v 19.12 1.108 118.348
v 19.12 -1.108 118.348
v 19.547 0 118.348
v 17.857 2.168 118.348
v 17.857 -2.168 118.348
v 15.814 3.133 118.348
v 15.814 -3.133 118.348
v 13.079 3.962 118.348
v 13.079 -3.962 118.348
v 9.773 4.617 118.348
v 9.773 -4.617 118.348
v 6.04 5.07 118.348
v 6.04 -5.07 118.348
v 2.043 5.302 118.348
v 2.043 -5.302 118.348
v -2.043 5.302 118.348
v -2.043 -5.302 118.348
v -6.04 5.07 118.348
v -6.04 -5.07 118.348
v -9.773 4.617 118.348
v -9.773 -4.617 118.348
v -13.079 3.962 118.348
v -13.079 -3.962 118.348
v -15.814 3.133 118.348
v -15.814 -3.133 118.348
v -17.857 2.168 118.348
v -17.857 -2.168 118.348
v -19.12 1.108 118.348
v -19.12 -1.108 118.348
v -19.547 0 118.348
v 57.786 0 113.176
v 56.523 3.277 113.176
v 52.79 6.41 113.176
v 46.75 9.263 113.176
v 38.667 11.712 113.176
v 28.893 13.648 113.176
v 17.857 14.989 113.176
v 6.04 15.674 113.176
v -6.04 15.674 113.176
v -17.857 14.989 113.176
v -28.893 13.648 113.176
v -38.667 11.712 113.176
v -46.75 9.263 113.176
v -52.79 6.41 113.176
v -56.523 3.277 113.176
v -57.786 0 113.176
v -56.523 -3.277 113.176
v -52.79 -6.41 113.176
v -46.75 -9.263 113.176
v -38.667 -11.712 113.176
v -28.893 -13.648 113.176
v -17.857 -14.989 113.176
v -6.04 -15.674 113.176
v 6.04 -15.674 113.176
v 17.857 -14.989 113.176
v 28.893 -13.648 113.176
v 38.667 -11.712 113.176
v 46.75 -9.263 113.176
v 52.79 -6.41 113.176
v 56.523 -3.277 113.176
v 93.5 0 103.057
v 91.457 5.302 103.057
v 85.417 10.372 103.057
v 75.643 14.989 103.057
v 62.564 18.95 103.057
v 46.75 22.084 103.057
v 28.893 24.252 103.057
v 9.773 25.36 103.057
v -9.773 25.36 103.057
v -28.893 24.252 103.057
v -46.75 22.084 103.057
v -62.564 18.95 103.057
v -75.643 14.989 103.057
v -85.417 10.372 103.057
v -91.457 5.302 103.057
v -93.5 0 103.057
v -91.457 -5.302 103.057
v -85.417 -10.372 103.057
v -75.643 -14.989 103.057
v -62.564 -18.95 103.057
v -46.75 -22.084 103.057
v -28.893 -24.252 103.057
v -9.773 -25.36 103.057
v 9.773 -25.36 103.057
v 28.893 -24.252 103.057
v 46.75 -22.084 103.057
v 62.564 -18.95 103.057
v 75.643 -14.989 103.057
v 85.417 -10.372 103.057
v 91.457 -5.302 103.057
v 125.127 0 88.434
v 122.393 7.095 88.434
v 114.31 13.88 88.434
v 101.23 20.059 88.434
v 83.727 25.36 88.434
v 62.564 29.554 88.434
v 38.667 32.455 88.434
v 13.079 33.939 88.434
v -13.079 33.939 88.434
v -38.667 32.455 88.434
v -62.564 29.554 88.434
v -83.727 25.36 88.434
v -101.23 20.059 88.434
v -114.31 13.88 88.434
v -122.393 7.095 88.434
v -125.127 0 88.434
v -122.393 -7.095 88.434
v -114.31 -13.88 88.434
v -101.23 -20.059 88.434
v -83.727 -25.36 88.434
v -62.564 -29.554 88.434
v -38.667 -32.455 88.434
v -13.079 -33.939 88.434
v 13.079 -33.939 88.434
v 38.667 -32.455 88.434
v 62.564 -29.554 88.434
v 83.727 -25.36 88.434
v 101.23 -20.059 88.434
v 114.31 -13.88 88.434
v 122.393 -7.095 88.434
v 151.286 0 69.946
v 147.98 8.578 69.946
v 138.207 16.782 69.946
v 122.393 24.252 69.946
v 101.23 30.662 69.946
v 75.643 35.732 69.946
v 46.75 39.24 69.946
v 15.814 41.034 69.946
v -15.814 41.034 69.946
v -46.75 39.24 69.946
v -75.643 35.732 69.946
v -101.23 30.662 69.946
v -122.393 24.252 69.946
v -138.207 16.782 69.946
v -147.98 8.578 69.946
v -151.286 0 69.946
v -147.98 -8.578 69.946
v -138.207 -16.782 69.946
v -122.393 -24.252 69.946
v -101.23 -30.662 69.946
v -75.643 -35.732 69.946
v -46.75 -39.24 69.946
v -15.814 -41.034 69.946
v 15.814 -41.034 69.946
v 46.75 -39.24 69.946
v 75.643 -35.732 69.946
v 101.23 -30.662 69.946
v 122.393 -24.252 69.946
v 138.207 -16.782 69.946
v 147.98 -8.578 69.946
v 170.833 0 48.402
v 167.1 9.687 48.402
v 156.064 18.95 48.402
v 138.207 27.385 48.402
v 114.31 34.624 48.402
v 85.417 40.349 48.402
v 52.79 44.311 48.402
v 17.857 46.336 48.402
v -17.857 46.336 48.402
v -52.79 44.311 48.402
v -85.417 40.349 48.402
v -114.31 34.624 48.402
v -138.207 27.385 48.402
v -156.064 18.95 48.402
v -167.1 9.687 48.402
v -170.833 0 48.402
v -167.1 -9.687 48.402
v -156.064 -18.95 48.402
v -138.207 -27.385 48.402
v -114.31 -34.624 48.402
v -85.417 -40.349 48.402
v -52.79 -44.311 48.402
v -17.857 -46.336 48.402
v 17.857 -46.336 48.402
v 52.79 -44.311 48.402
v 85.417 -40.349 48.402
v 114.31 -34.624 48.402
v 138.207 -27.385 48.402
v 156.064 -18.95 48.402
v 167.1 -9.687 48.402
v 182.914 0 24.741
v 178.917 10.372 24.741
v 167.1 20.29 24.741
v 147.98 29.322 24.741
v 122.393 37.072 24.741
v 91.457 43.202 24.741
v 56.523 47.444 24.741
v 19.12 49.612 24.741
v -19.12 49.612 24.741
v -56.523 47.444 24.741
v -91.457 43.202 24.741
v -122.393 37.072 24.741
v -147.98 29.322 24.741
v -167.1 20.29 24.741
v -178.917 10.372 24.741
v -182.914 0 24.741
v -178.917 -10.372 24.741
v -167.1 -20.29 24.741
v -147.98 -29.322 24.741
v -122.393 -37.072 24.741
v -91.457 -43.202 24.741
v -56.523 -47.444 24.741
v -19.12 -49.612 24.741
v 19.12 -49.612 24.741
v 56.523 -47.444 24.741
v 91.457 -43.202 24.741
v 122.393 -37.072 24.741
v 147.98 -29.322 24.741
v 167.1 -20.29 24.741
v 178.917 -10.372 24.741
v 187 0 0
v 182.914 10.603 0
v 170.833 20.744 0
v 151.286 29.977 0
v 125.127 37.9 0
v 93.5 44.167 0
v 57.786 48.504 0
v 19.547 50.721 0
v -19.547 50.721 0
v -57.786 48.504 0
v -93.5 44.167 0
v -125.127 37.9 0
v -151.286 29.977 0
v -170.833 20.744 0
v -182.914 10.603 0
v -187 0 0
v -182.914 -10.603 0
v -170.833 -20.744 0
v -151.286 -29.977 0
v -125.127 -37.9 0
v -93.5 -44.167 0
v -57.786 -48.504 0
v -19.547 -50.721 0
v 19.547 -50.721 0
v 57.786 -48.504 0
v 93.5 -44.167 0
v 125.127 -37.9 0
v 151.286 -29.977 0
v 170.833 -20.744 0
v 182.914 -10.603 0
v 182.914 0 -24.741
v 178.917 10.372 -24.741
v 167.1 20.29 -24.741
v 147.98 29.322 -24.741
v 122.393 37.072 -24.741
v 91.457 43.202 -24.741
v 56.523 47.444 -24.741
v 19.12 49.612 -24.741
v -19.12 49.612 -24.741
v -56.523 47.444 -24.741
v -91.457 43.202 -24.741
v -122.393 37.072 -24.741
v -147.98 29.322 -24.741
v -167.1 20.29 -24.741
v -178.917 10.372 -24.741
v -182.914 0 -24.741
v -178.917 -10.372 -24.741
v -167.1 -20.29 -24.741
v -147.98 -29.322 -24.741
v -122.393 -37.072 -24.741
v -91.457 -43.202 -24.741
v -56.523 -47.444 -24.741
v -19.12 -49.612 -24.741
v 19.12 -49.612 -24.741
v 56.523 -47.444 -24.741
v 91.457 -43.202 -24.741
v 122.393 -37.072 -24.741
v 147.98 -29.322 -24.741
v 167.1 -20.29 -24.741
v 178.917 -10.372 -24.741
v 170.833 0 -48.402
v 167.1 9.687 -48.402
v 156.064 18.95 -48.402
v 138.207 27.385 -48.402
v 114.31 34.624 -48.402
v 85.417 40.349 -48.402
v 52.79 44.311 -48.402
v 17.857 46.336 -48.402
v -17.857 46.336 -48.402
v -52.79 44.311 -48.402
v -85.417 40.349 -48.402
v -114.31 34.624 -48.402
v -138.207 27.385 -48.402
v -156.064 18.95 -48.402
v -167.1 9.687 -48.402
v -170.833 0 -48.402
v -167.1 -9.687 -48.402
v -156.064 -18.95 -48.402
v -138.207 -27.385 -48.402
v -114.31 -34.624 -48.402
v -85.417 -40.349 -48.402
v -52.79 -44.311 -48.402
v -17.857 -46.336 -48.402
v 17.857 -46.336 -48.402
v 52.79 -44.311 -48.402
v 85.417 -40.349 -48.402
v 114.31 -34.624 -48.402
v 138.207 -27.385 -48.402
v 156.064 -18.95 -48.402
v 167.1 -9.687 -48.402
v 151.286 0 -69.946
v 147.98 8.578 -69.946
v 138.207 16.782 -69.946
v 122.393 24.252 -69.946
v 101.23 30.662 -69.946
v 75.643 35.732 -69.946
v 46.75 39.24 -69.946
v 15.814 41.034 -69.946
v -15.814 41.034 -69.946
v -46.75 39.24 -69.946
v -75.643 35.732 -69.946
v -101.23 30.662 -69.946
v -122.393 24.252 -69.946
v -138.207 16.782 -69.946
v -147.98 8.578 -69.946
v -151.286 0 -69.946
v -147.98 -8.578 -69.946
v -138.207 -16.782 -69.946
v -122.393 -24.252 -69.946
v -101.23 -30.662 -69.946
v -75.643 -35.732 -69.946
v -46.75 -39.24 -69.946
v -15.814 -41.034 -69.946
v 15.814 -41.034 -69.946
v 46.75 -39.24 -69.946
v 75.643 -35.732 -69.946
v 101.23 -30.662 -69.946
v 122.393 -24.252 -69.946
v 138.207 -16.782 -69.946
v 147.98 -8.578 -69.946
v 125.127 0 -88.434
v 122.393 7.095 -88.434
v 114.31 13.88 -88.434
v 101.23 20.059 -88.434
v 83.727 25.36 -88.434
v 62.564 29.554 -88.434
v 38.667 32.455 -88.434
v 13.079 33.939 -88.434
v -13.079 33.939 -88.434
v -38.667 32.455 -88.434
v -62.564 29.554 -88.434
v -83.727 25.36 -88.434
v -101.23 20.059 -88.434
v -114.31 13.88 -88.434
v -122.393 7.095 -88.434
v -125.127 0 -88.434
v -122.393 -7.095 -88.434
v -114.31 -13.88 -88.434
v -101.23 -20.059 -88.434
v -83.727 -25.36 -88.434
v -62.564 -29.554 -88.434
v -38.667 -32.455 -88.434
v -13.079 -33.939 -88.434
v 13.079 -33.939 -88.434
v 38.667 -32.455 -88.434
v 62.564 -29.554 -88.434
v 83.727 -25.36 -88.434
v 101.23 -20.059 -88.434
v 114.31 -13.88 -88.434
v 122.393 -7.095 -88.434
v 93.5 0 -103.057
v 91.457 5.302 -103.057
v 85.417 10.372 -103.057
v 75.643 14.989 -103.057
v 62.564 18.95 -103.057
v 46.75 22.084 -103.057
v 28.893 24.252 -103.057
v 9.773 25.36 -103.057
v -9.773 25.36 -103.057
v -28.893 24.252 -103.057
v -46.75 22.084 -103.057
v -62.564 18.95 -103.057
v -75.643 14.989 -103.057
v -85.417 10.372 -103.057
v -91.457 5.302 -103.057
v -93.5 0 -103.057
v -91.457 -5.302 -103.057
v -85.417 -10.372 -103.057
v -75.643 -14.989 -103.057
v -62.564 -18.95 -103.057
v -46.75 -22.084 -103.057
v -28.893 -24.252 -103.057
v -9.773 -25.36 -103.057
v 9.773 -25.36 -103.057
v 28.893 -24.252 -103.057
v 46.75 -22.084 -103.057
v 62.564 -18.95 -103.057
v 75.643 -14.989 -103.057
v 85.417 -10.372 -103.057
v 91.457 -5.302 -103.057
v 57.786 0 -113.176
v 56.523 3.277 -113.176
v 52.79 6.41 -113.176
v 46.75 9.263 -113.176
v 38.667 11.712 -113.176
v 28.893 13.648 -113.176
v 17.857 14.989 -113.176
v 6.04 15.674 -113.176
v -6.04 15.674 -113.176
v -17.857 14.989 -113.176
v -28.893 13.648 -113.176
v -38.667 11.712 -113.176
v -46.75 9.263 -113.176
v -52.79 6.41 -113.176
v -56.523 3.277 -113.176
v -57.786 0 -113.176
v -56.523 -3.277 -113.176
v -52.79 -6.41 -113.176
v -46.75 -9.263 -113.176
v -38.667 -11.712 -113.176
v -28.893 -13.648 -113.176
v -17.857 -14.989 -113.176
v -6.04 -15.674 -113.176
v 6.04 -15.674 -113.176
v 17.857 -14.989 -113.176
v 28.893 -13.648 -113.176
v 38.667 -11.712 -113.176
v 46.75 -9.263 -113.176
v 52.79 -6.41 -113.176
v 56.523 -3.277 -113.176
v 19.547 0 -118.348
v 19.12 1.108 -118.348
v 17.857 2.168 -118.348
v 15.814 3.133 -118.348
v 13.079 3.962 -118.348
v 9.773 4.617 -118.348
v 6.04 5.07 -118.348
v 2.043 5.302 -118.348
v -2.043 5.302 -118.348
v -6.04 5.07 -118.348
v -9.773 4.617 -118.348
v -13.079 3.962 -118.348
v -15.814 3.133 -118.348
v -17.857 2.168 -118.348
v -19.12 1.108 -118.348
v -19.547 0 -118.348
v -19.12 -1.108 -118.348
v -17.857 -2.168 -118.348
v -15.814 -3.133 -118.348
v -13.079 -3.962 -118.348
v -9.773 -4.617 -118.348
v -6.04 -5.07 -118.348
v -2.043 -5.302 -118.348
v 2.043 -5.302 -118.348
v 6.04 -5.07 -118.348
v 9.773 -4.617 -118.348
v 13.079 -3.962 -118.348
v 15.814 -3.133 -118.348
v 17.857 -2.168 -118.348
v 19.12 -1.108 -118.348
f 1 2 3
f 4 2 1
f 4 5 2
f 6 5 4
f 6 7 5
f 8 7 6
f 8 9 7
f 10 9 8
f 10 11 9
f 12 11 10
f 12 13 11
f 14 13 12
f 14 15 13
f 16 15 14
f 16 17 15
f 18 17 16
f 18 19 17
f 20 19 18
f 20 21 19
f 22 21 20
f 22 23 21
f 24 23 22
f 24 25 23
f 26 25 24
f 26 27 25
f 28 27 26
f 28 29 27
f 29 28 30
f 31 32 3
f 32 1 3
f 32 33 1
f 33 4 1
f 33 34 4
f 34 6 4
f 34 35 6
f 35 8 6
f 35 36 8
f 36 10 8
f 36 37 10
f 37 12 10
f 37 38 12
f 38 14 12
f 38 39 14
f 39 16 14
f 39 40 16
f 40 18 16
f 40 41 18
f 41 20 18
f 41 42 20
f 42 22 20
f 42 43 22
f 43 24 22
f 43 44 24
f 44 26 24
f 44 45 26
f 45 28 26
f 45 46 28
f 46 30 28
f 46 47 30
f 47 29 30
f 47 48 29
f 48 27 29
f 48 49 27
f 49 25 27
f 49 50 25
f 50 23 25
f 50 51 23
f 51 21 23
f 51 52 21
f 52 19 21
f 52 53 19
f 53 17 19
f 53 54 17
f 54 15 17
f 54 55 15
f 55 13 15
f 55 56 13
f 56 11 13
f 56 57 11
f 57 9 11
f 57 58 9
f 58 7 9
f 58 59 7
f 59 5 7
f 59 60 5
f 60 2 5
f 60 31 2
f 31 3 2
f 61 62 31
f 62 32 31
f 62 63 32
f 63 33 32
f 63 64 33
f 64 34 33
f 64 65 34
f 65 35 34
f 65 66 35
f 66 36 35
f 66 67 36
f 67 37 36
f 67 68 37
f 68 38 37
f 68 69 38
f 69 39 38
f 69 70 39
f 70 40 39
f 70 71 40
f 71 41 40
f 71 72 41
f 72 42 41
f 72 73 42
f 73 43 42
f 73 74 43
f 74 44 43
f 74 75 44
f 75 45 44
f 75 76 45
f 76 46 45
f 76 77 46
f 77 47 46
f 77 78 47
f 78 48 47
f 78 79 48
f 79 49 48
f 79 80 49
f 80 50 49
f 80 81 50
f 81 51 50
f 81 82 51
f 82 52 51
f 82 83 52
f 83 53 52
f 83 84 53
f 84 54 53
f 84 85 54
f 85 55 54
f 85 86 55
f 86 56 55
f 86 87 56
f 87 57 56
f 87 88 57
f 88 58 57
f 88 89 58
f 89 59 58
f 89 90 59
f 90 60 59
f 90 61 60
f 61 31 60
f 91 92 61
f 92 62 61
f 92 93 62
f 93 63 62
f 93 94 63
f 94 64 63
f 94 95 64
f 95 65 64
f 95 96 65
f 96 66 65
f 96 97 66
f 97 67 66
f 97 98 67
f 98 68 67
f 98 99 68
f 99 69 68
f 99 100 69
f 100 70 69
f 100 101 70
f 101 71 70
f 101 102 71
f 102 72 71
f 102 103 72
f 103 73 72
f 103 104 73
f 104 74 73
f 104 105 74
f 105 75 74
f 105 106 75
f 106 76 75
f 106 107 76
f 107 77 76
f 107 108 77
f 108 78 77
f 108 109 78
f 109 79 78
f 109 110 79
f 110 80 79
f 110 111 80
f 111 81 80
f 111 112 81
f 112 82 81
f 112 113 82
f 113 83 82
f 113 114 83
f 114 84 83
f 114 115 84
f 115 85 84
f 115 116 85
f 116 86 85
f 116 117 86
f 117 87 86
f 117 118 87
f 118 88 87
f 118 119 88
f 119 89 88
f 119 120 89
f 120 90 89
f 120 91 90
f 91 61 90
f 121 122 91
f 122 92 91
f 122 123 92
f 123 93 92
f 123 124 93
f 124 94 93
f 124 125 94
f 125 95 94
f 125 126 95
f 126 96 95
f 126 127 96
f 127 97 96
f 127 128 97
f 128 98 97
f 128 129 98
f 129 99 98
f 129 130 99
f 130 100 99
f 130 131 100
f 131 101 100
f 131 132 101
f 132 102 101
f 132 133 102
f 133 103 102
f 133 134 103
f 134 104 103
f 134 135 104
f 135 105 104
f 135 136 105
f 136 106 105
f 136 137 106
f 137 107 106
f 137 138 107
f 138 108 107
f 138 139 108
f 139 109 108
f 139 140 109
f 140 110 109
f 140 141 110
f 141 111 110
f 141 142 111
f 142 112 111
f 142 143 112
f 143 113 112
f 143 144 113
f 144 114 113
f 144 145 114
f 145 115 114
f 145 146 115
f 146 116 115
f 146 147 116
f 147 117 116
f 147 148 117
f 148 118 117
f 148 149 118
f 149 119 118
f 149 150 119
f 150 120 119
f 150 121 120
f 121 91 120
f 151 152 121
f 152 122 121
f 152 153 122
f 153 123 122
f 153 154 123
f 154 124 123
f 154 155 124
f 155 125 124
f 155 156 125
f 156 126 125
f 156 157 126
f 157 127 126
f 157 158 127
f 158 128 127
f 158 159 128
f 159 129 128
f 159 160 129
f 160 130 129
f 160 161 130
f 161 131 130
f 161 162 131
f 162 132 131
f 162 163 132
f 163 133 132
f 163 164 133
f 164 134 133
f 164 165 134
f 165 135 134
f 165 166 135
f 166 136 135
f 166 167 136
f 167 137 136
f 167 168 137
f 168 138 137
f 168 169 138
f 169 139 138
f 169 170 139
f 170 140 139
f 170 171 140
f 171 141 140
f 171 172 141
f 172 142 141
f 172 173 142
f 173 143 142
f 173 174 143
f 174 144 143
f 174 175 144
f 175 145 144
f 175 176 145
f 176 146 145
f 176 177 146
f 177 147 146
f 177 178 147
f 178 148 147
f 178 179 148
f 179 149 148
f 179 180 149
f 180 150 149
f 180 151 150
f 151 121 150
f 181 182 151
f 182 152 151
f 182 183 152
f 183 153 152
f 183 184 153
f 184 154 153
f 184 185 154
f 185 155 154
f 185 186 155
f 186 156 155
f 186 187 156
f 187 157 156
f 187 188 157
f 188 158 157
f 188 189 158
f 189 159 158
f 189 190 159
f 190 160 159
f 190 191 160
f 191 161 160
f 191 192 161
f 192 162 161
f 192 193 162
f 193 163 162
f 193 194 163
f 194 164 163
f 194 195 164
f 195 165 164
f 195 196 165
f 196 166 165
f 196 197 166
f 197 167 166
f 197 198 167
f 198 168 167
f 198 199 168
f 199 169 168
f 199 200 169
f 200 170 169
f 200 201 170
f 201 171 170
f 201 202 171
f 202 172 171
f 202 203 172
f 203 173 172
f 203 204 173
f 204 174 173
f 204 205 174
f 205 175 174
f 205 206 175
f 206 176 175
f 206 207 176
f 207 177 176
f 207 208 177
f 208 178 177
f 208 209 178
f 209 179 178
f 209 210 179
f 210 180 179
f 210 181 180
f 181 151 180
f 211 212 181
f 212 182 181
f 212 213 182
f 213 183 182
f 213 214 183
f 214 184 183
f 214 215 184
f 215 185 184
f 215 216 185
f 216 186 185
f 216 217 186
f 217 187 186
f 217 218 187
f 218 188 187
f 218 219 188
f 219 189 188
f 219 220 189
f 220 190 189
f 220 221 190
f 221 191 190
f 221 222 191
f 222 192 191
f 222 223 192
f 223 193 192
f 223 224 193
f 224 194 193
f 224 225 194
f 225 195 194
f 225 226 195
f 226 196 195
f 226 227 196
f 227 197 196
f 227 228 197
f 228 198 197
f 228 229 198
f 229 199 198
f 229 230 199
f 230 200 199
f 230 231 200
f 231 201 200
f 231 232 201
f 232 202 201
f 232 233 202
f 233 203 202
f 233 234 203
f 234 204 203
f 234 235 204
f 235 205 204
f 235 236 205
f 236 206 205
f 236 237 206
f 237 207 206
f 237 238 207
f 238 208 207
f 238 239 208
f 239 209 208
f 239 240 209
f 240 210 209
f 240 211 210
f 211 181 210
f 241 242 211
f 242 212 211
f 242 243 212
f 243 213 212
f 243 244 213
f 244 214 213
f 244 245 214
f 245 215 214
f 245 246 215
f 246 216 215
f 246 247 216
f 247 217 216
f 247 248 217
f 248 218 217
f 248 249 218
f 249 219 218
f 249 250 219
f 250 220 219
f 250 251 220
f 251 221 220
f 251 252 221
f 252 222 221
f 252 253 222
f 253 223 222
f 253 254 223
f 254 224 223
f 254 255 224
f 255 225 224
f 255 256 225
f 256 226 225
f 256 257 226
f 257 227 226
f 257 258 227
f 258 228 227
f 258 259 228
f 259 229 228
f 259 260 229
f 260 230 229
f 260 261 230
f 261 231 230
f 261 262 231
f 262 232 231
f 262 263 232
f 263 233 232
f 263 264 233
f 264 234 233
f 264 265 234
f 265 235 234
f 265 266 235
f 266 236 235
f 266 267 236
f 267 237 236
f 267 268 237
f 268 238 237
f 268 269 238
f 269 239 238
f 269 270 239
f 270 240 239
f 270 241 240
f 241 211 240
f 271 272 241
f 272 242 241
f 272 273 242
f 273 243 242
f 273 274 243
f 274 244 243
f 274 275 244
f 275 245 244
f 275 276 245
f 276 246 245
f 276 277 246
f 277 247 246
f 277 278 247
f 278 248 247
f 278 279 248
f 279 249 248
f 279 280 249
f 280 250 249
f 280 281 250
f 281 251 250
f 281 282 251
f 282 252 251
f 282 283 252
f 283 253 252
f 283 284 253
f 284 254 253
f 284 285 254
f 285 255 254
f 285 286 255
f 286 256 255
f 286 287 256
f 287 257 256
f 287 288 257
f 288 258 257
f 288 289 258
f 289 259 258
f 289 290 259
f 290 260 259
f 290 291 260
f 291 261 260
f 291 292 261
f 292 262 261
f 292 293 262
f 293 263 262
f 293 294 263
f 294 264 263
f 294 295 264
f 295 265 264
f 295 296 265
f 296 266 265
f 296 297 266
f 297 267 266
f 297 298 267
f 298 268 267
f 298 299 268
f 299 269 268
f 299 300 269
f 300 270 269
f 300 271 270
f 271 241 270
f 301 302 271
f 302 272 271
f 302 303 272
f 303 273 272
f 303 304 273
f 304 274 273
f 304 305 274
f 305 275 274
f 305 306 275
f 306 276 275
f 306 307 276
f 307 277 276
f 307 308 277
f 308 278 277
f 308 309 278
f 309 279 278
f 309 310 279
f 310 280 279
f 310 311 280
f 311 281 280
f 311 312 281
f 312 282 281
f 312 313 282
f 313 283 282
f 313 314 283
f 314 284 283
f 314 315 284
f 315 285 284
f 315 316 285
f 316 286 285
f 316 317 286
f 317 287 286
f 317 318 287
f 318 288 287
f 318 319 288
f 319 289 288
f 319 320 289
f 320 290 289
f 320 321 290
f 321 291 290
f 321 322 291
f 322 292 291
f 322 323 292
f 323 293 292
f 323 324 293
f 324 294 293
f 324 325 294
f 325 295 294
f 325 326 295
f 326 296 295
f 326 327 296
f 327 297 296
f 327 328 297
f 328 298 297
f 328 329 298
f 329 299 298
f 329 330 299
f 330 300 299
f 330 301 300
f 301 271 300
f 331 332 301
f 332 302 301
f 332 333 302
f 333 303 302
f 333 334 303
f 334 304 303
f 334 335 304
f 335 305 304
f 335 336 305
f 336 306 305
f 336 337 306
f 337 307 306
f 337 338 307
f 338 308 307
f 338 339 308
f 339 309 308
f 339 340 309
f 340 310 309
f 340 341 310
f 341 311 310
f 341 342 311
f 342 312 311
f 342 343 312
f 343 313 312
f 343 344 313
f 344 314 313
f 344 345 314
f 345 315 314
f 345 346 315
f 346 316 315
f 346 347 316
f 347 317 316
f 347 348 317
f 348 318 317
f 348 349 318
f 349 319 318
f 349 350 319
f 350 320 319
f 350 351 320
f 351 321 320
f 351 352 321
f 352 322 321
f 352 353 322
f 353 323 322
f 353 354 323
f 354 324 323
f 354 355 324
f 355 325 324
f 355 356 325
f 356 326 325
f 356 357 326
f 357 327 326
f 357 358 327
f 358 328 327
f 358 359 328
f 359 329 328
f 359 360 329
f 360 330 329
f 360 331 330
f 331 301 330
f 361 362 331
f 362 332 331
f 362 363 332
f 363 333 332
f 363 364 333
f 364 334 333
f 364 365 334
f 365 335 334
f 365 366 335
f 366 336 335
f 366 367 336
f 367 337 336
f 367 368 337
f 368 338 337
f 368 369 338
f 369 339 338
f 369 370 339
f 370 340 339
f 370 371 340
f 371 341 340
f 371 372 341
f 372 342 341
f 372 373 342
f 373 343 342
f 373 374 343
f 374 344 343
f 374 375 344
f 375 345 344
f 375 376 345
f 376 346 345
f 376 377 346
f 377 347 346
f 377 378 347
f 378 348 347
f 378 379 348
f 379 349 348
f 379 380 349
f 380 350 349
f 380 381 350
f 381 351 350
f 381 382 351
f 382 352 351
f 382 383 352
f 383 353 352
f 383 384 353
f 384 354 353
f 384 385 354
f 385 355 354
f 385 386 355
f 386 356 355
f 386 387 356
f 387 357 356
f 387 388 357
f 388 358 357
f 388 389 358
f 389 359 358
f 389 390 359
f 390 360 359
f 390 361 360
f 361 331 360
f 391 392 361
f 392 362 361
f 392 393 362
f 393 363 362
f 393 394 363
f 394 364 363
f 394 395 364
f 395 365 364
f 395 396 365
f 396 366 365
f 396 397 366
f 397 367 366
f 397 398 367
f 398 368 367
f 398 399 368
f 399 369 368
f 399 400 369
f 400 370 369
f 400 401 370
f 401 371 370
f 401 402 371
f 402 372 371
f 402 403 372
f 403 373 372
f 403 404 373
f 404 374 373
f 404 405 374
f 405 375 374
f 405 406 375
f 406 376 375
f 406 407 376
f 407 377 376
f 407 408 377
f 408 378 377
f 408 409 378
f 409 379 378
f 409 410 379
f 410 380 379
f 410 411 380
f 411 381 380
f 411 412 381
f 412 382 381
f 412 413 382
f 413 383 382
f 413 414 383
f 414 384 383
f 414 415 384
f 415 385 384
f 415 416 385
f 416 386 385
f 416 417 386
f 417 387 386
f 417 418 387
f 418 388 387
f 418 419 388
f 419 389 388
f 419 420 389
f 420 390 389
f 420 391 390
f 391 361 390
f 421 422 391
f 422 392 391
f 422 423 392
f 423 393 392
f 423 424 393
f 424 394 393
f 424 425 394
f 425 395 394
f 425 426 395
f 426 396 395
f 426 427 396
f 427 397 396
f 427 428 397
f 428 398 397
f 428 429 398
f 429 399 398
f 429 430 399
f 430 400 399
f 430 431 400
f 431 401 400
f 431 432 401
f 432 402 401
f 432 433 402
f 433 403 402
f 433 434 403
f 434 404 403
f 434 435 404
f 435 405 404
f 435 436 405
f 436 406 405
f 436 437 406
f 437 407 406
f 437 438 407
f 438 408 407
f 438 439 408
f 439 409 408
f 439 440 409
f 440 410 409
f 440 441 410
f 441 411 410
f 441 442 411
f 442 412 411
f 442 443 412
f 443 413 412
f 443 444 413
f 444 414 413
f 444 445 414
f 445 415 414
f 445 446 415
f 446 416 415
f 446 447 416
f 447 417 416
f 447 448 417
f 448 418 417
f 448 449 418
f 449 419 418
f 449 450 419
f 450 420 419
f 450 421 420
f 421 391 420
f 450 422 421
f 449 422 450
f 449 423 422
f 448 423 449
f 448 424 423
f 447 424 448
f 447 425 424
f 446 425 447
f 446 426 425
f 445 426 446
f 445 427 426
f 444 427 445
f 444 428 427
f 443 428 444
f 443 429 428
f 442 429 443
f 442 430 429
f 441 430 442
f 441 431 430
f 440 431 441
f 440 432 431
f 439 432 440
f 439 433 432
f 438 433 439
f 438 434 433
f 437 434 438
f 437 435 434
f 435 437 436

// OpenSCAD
// Generated by SolidPython 1.0.1 on 2020-07-29 00:46:49


scale(v = [11, 3, 7]) {
	sphere(r = 17);
}
/***********************************************
*********      SolidPython code:      **********
************************************************
 
# import packages: SolidPython
from solid import *
from solid.utils import *
from itertools import chain, combinations, permutations


class Resize:

    def __init__(self, scad_file):
        self.scad_file = scad_file
        #self.scad_file = import_scad(scad_file)
        # cone/cylinder param:
        self.r1 = 0
        self.r2 = 0
        self.h = 0
        # rectangular prism param:
        self.w = 0
        self.l = 0
        # ellipse param:
        self.r = 0

    # import OpenScad code (file name corresponds to shape)


    # classify shape + parameters
    def assign(self, param1, param2, param3):
        if self.scad_file == 'cone.scad':
            self.r1 = param1
            self.r2 = param2
            self.h = param3
        elif self.scad_file == 'cylinder.scad':
            self.r1 = param1
            self.r2 = param2
            self.h = param3
        elif self.scad_file == 'rectangularPrism.scad':
            self.h = param1
            self.l = param2
            self.w = param3
        else:
            self.r = param1
            self.h = param2

    # resize parameters
    def iterate(self):
        x = range(3, 20, 2)
        i = 1
        if self.scad_file == 'cone.scad':
            tempList = list(permutations(x, 2))
            for temp in tempList:
                param1 = temp[0]
                param2 = temp[1]
                filepath = 'produced_scad_files/' + 'cone' + str(param1) + '_' + str(param2) + '_' + '.scad'
                scad_render_to_file(cylinder(h=param1, r1=param2, r2=0), filepath)

        elif self.scad_file == 'cylinder.scad':
            tempList = list(permutations(x, 3))
            for temp in tempList:
                param1 = temp[0]
                param2 = temp[1]
                filepath = 'produced_scad_files/' + 'cylinder' + str(param1) + '_' + str(param2) + '_' + '.scad'
                scad_render_to_file(cylinder(h=param1, r1=param2, r2=param2), filepath)

        elif self.scad_file == 'rectangularPrism.scad':
            tempList = list(permutations(x, 3))
            for temp in tempList:
                param1 = temp[0]
                param2 = temp[1]
                param3 = temp[2]
                filepath = 'produced_scad_files/' + 'rectangularPrism' + str(param1) + '_' + str(param2) + '_' + str(
                    param3) + '.scad'
                scad_render_to_file(cube(size=(param1, param2, param3)), filepath)

        elif self.scad_file == 'ellipse.scad':
            tempList = list(permutations(x, 4))
            for temp in tempList:
                param1 = temp[0]
                param2 = temp[1]
                param3 = temp[2]
                param4 = temp[3]
                filepath = 'produced_scad_files/' + 'ellipse' + str(param1) + '_' + str(param2) + '_' + str(param3) + '_' + str(param4) + '.scad'
                scad_render_to_file(scale([param1, param2, param3])(sphere(r=param4)), filepath)

    def render_to_scadfile(self):
        scad_render_to_file(scad, 'example.scad') 
 
************************************************/
